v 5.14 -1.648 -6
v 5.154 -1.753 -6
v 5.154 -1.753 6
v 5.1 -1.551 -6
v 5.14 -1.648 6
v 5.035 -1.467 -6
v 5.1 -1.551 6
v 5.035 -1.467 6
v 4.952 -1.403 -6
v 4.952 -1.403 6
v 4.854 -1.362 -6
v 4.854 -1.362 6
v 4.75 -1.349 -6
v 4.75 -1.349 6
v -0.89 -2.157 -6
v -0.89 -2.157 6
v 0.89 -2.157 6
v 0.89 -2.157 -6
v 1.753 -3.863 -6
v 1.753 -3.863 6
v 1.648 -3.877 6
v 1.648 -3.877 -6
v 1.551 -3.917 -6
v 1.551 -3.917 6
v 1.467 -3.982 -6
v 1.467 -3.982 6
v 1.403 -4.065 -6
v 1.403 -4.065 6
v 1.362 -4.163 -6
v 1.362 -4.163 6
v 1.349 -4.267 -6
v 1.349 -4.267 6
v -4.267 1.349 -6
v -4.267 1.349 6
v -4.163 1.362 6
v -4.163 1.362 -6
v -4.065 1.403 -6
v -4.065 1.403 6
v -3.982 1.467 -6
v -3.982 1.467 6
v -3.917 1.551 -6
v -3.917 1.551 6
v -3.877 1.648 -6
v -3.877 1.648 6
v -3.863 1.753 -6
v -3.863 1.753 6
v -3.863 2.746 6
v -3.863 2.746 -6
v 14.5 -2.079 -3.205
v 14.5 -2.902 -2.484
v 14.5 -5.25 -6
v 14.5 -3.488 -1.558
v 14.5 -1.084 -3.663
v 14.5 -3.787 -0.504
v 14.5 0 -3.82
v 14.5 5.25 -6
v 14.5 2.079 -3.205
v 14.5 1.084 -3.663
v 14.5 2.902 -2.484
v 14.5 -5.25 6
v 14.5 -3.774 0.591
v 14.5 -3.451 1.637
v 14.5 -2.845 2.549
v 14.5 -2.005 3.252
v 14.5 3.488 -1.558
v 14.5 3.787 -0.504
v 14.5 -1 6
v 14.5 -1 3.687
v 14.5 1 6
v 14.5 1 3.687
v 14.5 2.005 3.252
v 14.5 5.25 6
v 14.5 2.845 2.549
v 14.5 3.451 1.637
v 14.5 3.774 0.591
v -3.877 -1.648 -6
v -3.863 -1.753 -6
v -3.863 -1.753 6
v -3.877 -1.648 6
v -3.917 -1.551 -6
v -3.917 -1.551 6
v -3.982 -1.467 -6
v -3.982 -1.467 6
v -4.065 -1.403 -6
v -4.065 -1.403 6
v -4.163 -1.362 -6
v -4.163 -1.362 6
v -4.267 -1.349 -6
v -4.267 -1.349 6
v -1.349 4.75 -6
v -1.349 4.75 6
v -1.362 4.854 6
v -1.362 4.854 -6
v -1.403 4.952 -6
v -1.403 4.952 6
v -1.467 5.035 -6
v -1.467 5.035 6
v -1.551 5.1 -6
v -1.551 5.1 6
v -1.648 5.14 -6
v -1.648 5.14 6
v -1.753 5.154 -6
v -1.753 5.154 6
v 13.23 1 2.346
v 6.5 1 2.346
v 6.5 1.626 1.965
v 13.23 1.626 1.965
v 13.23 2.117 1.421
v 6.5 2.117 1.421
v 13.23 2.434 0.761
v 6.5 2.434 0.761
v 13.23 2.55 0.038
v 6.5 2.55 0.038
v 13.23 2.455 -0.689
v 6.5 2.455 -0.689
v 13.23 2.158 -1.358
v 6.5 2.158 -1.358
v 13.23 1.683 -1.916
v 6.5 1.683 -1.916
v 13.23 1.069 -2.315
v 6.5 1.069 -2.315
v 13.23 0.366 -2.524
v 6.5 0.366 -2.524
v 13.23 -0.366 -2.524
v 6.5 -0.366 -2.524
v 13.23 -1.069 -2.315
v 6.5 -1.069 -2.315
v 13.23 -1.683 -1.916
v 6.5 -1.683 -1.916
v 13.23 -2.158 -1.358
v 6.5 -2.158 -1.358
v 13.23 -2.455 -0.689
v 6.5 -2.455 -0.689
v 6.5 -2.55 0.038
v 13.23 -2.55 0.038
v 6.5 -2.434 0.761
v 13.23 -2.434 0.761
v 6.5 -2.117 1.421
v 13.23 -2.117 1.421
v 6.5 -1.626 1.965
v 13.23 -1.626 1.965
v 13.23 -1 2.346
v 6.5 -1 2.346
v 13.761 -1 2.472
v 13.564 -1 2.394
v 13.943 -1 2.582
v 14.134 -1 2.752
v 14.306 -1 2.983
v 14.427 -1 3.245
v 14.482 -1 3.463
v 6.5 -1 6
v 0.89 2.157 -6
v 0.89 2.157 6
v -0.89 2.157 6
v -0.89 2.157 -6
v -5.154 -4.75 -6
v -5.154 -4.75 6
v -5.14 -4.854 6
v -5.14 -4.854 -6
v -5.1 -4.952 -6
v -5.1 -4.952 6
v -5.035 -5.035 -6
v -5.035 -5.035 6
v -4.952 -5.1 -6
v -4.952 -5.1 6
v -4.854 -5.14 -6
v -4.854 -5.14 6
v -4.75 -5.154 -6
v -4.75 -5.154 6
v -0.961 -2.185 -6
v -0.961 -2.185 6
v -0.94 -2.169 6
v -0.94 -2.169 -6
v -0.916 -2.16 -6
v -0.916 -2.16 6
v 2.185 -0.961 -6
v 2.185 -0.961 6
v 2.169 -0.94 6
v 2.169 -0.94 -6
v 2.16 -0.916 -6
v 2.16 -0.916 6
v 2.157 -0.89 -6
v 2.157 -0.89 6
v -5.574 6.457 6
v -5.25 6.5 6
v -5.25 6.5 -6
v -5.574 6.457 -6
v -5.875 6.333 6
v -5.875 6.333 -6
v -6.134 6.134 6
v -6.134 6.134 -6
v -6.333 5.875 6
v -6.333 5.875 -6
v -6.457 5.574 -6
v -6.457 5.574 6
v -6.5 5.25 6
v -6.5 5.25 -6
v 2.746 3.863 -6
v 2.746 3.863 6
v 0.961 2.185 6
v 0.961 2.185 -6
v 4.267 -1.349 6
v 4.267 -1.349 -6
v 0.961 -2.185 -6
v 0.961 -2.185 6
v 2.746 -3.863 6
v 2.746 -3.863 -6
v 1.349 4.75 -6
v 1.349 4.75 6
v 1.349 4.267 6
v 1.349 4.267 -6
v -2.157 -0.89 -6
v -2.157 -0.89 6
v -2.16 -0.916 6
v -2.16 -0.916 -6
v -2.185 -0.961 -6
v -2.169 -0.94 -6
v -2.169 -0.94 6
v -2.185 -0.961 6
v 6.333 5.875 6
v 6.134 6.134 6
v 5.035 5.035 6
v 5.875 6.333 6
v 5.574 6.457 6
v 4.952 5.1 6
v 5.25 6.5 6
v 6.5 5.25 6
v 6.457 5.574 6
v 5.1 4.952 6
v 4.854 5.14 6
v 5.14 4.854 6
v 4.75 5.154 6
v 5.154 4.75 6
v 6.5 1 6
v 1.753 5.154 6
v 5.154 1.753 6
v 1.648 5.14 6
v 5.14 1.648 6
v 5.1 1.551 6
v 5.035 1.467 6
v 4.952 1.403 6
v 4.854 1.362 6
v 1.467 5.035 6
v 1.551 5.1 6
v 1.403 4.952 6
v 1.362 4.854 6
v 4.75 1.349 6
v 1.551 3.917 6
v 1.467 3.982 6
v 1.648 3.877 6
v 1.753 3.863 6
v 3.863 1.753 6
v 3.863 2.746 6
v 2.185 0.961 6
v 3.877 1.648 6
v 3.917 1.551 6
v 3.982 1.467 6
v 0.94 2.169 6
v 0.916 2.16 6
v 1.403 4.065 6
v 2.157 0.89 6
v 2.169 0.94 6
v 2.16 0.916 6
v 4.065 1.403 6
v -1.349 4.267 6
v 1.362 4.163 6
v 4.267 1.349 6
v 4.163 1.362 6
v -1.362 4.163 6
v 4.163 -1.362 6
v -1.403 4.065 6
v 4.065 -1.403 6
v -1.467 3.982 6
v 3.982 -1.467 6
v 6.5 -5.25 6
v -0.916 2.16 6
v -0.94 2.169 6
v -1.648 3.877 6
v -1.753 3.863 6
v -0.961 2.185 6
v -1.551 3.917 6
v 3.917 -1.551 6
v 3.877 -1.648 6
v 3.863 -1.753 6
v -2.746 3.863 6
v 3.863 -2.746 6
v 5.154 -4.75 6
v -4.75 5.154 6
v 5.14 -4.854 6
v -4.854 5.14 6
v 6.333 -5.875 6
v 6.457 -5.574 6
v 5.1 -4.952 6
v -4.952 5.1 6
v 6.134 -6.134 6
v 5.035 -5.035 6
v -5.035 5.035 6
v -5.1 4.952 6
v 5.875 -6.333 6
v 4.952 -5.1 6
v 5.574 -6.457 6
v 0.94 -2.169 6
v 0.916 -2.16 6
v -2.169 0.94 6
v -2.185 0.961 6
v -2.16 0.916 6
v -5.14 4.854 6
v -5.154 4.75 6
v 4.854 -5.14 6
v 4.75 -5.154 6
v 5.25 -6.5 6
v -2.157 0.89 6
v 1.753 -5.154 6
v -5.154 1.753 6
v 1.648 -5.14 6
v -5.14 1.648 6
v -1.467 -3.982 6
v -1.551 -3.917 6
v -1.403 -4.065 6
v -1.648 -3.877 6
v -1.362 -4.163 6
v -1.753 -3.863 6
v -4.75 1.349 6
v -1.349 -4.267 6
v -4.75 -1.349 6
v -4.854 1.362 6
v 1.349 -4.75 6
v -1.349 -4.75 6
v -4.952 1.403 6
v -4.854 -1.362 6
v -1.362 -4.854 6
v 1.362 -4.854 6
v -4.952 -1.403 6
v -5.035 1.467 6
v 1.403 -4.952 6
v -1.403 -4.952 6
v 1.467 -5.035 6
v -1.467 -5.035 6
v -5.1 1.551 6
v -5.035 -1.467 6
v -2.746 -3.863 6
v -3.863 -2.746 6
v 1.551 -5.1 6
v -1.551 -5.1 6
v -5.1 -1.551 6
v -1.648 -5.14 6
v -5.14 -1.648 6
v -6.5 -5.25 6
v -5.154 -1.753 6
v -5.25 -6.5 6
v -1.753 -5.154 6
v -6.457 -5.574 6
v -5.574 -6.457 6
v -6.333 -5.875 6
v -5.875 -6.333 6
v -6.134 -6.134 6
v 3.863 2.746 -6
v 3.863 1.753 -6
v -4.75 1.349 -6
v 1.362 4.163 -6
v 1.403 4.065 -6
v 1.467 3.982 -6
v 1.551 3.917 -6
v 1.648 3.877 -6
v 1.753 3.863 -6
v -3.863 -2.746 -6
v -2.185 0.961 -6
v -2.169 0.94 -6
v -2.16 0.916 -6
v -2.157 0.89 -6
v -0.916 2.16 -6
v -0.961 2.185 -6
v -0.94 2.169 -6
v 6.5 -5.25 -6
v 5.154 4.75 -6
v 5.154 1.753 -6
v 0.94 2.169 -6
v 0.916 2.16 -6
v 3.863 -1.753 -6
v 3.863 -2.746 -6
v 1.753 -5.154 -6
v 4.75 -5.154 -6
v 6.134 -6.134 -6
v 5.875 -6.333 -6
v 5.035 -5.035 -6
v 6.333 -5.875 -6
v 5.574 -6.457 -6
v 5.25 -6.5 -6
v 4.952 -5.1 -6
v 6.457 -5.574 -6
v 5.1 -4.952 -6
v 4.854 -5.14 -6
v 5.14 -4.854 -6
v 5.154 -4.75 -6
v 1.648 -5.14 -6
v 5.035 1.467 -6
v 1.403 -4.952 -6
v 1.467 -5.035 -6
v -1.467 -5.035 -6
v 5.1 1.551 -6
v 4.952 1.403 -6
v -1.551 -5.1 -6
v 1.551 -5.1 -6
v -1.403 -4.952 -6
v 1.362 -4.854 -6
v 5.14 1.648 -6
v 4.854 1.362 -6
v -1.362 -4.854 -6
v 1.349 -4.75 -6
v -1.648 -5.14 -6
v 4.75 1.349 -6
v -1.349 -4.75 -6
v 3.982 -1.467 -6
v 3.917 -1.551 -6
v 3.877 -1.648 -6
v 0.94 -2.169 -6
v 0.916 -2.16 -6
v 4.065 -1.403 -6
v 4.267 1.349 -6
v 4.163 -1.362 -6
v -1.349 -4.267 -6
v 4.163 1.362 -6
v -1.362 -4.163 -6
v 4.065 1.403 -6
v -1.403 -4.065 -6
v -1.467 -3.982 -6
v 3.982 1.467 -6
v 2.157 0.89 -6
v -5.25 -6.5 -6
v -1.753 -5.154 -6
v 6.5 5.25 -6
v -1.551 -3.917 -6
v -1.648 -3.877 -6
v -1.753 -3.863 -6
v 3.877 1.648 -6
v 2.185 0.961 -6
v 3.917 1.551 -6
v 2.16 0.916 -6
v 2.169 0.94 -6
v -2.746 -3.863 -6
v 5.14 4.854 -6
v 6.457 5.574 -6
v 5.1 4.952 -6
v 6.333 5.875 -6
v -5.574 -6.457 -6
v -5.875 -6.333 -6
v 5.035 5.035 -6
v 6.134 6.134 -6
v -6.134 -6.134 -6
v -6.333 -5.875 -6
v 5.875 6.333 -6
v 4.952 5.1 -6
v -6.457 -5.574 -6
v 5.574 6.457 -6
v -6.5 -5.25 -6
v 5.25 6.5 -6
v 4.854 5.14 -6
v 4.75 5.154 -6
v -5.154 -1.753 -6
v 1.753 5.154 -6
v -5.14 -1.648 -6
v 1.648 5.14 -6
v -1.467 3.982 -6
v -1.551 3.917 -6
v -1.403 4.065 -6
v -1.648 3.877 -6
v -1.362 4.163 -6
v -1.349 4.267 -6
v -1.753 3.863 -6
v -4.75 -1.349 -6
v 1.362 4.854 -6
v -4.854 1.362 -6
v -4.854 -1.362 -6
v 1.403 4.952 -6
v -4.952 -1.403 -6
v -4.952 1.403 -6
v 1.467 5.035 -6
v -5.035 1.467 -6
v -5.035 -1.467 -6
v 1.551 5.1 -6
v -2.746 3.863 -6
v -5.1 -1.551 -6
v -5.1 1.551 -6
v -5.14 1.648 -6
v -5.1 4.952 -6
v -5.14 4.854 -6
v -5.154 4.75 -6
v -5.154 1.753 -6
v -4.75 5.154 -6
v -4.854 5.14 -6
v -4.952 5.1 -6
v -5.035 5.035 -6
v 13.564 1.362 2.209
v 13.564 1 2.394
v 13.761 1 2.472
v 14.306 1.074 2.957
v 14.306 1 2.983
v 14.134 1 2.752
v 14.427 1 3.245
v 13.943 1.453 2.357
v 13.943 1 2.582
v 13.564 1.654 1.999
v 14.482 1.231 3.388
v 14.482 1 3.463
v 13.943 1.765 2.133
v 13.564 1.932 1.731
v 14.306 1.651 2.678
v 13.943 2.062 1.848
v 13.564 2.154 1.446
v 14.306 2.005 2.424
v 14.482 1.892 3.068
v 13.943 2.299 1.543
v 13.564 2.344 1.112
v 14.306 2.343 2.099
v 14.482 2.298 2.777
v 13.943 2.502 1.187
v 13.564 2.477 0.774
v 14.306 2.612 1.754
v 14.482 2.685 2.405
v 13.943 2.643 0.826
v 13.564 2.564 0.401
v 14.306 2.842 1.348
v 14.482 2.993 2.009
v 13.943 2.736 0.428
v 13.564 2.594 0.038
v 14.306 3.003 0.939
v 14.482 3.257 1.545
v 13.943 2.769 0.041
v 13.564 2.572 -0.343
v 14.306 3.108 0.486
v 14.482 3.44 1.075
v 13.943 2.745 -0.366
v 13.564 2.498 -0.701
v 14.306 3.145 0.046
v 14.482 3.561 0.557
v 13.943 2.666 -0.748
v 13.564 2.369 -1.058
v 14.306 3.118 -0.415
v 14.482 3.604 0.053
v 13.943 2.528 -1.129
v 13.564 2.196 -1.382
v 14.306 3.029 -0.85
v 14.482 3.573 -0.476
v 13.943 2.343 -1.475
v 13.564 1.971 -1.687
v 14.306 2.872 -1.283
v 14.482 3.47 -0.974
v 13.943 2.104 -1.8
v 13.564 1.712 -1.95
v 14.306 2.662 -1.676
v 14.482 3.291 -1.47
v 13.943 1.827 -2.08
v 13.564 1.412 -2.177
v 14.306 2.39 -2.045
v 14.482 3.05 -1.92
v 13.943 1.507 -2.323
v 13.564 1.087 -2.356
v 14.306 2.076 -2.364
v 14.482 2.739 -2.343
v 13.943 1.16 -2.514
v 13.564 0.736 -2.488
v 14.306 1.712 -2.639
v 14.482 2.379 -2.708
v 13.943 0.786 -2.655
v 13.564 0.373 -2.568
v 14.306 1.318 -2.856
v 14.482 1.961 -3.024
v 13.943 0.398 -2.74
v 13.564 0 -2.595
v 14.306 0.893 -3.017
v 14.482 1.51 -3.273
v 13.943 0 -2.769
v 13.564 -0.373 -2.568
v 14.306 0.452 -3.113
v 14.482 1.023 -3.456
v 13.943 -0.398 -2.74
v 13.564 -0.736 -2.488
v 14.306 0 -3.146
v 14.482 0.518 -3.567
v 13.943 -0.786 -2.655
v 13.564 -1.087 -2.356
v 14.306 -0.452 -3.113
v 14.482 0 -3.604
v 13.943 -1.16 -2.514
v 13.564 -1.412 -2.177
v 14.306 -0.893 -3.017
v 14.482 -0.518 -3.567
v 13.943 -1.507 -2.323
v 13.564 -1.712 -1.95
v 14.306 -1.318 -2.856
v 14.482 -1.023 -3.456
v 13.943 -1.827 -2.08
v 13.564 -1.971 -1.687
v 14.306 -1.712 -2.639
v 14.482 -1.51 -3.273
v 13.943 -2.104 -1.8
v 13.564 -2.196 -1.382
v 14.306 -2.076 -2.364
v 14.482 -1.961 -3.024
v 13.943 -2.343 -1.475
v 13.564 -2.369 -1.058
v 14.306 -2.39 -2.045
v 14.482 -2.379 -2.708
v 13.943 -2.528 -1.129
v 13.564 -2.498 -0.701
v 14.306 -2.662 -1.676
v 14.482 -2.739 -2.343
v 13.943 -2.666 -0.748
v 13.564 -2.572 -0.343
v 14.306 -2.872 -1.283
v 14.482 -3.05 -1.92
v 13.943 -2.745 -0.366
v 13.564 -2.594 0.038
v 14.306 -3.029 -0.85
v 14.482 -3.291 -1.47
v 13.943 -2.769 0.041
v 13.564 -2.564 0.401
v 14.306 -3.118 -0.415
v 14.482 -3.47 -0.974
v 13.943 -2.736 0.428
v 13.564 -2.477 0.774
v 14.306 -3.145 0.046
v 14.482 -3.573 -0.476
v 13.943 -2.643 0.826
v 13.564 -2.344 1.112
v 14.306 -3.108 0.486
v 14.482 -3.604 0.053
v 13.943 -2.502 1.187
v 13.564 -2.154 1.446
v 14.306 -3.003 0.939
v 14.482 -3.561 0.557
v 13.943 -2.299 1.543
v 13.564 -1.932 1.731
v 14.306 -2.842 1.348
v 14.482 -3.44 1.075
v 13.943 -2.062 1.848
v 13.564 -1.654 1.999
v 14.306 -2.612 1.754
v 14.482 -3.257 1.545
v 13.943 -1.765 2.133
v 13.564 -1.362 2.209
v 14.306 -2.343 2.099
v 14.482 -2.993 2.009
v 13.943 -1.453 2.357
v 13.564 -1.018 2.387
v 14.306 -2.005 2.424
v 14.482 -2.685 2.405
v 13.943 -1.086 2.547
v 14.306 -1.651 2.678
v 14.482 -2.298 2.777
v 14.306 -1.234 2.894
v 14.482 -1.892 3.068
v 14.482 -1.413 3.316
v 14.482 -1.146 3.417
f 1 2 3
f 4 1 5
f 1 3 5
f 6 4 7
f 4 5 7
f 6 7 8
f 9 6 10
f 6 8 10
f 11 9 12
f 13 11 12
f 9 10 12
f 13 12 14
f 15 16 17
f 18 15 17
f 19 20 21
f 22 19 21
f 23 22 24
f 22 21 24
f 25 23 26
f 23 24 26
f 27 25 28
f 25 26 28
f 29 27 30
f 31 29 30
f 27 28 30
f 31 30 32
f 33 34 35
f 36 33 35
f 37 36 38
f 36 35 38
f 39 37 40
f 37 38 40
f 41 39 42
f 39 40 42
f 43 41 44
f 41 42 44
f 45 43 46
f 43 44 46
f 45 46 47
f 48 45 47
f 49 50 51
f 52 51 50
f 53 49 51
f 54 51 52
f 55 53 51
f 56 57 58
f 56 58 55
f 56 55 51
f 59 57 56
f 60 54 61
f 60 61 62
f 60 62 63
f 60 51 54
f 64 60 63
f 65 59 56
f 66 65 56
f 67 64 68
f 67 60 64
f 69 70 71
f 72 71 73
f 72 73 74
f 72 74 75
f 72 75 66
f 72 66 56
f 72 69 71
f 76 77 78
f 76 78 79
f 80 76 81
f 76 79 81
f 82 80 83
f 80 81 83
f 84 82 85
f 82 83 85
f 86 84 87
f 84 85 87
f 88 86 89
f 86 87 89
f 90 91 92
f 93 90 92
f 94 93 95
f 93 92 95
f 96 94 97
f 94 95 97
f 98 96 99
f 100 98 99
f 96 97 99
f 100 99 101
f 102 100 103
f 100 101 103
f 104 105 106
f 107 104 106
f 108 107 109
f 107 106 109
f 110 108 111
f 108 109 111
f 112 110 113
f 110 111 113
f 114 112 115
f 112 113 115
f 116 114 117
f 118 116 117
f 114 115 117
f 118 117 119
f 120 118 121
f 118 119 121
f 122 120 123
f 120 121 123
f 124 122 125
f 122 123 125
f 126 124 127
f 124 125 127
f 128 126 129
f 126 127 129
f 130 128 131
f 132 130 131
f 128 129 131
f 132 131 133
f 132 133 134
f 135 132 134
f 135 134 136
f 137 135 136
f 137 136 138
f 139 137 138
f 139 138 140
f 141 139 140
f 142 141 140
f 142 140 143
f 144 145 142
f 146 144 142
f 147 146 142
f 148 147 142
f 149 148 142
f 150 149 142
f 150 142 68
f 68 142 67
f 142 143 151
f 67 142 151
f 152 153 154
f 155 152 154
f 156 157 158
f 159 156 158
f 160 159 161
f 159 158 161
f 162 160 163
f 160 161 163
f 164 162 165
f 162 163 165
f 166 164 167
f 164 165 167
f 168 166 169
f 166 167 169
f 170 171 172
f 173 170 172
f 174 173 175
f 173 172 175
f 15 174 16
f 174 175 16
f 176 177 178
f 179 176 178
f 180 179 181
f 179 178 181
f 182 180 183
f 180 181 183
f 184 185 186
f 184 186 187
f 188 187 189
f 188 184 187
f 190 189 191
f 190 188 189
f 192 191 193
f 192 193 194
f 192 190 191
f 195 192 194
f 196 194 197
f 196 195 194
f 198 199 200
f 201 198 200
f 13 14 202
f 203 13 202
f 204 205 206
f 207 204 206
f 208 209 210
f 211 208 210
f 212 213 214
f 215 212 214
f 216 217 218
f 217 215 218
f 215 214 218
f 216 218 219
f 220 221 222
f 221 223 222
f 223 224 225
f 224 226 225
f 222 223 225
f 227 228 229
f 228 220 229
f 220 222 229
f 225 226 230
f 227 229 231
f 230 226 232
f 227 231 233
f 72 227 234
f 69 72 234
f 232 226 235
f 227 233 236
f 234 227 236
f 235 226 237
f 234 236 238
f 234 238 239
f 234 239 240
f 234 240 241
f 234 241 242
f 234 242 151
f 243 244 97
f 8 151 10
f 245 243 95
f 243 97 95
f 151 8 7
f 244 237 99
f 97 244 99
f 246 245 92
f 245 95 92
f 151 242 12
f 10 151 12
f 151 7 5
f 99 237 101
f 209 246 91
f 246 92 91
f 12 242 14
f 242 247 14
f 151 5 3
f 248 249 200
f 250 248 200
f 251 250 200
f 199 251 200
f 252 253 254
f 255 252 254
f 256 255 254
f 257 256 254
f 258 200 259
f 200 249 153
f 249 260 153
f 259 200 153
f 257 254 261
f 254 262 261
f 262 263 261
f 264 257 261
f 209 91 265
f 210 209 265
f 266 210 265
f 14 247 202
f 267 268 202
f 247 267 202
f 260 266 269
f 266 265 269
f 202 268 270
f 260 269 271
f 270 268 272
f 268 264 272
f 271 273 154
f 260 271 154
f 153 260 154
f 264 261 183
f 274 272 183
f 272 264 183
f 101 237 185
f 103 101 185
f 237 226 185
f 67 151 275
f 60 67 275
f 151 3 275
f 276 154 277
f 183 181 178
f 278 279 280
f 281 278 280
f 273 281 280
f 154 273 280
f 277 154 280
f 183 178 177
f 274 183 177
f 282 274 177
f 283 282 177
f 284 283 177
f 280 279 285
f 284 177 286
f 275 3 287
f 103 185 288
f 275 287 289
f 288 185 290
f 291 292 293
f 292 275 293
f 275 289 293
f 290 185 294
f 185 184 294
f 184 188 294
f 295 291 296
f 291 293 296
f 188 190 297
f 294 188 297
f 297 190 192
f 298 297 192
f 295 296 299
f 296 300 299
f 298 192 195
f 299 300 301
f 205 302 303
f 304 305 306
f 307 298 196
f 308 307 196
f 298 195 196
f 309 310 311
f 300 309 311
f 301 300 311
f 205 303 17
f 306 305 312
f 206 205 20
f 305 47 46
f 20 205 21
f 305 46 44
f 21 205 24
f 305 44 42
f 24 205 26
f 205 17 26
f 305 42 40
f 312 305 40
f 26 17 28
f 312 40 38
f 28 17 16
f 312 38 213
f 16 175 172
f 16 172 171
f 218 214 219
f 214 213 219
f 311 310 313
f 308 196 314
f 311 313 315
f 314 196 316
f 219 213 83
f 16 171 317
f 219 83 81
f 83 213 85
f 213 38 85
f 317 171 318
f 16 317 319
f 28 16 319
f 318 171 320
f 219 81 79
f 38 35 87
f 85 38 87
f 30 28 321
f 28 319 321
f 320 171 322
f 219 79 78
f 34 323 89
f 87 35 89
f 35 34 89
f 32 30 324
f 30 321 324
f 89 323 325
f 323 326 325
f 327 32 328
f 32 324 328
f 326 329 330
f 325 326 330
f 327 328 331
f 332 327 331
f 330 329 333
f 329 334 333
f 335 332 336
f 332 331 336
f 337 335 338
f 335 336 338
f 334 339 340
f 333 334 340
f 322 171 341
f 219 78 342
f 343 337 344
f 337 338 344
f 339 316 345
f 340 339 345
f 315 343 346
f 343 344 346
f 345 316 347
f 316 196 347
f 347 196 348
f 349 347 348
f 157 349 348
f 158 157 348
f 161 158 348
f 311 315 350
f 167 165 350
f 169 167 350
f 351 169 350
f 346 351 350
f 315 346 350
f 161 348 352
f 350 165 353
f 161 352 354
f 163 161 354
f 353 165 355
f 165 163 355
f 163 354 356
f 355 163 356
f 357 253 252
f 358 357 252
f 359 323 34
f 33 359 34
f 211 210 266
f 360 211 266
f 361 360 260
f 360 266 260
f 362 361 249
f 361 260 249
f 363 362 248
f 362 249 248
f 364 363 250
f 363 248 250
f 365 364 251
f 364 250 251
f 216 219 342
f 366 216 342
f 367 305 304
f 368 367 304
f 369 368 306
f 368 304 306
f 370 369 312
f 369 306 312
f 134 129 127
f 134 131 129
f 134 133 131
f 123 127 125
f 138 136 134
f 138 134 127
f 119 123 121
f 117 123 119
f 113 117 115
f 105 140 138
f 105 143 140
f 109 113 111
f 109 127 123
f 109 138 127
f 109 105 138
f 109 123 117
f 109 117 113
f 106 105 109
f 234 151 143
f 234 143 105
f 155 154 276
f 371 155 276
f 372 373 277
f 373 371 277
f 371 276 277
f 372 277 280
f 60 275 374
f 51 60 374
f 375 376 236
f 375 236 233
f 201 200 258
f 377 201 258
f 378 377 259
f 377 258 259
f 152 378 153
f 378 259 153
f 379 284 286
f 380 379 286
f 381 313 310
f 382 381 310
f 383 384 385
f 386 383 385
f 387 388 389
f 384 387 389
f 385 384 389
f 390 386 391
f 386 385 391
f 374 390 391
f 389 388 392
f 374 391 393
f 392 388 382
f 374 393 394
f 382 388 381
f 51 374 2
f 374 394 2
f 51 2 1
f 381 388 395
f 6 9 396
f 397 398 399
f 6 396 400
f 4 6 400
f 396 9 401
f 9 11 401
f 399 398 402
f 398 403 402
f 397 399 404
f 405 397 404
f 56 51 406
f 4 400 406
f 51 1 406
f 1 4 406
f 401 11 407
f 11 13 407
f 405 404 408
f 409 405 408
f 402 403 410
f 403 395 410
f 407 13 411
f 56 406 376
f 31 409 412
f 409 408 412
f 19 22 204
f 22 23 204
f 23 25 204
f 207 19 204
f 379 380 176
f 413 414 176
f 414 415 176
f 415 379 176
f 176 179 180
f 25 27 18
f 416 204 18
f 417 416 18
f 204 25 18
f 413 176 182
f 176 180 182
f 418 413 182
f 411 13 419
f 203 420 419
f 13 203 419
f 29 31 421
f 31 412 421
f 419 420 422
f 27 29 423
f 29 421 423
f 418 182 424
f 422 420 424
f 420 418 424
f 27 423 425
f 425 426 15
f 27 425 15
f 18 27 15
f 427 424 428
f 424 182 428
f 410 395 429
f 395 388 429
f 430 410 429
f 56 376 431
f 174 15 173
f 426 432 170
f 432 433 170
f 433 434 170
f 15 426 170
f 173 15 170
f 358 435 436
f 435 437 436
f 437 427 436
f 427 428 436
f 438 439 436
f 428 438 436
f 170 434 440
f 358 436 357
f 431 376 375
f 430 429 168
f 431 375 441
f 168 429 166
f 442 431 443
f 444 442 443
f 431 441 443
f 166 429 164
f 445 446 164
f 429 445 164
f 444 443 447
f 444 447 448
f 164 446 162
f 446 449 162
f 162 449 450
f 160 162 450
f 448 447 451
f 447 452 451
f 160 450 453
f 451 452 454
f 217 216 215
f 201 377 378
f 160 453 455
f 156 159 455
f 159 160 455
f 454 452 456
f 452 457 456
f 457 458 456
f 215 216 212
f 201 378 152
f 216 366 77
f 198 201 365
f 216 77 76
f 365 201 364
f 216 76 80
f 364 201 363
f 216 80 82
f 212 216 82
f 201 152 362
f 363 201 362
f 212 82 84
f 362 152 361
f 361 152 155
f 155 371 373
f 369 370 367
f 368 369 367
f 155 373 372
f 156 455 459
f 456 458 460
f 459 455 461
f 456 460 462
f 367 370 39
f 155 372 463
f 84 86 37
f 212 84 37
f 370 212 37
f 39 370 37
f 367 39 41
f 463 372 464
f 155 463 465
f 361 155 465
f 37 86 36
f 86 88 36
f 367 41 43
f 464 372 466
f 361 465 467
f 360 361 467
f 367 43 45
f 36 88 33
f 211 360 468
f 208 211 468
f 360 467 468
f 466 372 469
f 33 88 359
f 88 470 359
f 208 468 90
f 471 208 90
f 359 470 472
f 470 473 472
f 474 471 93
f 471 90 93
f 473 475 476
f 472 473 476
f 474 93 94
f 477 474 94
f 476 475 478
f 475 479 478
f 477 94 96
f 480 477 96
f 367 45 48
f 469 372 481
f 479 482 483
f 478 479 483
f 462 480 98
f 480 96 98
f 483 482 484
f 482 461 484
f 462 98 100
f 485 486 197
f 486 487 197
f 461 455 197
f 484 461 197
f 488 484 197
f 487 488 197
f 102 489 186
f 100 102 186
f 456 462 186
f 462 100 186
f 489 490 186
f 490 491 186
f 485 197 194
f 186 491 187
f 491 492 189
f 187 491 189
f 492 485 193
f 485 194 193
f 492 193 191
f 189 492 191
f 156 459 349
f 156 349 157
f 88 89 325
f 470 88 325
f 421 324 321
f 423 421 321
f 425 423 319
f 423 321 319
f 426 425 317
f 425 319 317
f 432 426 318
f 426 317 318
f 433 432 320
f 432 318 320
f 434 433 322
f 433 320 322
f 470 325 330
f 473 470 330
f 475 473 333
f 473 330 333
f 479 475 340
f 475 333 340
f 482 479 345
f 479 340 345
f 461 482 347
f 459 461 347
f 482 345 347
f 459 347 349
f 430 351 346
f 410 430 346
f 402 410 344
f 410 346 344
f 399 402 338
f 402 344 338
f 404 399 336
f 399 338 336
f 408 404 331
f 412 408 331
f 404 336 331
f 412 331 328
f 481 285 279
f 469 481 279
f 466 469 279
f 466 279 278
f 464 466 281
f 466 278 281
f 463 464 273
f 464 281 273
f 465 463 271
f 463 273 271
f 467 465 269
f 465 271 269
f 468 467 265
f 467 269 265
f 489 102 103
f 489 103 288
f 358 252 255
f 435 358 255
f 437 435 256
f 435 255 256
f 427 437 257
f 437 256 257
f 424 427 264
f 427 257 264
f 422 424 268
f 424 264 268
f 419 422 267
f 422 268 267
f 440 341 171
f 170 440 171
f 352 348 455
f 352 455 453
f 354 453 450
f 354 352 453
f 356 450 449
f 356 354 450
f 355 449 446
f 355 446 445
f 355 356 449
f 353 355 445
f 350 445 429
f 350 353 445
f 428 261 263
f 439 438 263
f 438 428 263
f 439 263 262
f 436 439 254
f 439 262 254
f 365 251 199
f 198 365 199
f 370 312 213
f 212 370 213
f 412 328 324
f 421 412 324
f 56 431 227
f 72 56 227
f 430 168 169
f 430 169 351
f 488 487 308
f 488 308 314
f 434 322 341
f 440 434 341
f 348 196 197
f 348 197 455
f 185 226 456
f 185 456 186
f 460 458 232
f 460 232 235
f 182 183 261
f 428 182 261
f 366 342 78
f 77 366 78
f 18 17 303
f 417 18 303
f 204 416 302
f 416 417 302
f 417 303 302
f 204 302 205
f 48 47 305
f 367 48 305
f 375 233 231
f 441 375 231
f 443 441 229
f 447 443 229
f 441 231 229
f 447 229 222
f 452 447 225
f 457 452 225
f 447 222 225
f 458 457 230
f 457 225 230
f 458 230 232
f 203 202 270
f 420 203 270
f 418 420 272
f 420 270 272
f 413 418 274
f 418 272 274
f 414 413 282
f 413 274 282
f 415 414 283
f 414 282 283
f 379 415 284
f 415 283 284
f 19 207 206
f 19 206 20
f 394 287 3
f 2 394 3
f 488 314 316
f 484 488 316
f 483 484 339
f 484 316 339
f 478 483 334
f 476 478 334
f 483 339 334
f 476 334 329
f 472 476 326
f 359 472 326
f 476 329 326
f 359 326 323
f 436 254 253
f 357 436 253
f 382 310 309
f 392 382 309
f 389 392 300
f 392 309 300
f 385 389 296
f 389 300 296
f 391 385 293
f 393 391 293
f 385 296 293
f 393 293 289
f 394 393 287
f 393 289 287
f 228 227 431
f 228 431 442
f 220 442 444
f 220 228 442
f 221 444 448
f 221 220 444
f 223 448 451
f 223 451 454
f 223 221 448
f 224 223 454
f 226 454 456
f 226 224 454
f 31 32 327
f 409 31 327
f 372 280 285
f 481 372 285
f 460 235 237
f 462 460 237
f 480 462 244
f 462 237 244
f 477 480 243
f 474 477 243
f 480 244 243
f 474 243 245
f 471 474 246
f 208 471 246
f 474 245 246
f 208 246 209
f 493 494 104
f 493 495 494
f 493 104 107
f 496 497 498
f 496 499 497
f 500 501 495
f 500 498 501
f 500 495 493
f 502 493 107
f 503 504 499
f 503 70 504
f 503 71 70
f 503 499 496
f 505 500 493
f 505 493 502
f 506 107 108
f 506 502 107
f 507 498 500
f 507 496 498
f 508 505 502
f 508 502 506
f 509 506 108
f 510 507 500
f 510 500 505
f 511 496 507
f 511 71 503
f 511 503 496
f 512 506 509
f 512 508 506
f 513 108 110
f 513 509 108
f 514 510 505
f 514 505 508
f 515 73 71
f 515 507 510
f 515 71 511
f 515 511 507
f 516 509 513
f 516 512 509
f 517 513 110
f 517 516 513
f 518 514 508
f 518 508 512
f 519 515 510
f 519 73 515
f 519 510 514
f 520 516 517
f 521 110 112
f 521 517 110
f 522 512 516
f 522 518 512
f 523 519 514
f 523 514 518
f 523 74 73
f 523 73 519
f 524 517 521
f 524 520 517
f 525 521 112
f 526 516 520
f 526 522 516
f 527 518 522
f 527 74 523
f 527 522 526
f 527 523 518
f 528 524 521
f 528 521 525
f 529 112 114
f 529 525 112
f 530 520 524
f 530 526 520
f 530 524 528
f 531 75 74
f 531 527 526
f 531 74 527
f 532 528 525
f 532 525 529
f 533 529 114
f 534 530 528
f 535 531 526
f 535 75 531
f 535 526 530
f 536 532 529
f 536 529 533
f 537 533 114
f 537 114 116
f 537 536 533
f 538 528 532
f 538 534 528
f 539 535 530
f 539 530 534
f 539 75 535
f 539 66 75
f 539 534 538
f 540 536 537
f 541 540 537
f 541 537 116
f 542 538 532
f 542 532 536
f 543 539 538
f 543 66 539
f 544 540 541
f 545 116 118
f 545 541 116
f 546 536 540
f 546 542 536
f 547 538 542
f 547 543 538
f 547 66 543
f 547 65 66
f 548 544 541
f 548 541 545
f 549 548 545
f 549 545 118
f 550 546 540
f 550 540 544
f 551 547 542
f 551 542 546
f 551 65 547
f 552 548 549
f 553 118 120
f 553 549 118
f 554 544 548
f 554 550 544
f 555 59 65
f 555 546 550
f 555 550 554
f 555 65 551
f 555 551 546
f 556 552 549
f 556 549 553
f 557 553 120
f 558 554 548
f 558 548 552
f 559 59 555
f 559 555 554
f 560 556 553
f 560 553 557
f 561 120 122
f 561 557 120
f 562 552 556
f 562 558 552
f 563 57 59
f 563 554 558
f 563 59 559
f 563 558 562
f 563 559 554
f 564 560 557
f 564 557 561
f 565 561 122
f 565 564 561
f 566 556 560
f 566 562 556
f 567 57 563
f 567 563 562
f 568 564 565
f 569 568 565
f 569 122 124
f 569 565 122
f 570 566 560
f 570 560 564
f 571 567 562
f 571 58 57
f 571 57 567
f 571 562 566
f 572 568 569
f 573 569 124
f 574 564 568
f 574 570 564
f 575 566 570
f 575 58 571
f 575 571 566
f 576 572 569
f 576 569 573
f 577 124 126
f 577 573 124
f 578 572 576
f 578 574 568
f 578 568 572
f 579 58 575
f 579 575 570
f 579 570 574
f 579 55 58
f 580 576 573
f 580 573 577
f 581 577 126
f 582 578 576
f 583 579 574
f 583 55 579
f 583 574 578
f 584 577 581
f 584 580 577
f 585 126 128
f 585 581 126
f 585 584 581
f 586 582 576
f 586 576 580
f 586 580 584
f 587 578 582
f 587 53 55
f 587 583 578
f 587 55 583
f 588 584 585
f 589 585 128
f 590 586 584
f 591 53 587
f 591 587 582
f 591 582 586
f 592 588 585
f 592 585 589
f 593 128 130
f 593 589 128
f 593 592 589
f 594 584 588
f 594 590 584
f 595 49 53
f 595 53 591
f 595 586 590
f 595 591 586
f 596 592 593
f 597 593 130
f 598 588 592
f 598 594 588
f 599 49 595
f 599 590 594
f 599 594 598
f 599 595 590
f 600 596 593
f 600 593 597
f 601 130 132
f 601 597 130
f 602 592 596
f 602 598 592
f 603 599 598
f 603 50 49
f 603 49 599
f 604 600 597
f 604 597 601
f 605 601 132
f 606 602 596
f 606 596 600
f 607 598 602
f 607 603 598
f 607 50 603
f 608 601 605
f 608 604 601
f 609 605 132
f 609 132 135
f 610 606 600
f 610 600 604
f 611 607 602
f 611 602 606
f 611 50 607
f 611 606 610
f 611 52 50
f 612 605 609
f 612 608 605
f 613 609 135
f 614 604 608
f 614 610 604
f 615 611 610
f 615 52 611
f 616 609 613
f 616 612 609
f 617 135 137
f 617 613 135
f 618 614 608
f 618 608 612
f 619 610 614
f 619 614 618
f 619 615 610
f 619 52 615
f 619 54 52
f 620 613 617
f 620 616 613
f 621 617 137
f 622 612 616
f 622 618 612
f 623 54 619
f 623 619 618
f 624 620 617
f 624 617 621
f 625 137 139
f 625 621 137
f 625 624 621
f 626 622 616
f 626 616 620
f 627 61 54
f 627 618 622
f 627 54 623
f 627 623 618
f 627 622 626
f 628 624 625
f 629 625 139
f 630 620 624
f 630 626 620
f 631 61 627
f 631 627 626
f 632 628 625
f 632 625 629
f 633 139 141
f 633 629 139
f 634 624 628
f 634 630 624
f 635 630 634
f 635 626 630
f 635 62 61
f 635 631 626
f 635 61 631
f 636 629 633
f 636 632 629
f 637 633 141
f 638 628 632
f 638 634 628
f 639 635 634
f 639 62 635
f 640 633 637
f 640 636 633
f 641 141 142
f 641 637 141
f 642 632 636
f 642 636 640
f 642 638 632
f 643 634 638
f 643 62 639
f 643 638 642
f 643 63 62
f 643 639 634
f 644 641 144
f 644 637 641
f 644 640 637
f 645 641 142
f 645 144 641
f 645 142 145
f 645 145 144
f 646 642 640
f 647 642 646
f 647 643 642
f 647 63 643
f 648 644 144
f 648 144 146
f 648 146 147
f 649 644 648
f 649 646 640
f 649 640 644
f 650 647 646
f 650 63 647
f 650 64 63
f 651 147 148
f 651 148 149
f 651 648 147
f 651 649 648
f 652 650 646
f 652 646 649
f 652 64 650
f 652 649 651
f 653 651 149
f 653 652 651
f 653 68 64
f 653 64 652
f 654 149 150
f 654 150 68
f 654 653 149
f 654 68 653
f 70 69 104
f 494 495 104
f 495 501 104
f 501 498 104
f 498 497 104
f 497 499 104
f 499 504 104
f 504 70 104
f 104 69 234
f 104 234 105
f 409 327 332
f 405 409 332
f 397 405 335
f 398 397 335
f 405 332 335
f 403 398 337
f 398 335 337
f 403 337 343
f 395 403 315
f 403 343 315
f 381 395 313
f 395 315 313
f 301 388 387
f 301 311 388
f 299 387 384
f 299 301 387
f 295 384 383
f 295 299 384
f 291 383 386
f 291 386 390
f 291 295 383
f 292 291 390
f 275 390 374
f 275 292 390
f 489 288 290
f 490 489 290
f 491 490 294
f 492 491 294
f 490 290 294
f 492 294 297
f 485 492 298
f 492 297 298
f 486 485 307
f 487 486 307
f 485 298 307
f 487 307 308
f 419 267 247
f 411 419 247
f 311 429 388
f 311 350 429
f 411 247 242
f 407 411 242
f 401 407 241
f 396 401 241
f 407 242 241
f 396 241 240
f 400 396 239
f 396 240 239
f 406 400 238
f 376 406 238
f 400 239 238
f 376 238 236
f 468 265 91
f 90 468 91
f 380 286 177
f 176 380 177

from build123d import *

# Parameters (mm, degrees)
F1_DEPTH = 6
F3_DEPTH = 10
F5_DEPTH = 8
F6_R     = 1.27


with BuildPart() as f1:
    # F0 (on Top) → F1 (new body, symmetric)
    with BuildSketch(Plane.XY):
        with BuildLine():
            Line((6.5, -5.25), (6.5, 5.25))
            ThreePointArc((6.5, 5.25), (6.133883, 6.133883), (5.25, 6.5))
            Line((5.25, 6.5), (-5.25, 6.5))
            ThreePointArc((-5.25, 6.5), (-6.133883, 6.133883), (-6.5, 5.25))
            Line((-6.5, 5.25), (-6.5, -5.25))
            ThreePointArc((-6.5, -5.25), (-6.133883, -6.133883), (-5.25, -6.5))
            Line((-5.25, -6.5), (5.25, -6.5))
            ThreePointArc((5.25, -6.5), (6.133883, -6.133883), (6.5, -5.25))
        make_face()
    extrude(amount=F1_DEPTH, both=True)

    # F2 (on Top) → F3 (cut, symmetric)
    with BuildSketch(Plane.XY):
        with BuildLine():
            ThreePointArc((0.889914, -2.1566), (0.928239, -2.163918), (0.961171, -2.184843))
            Line((0.961171, -2.184843), (2.745753, -3.863205))
            Line((2.745753, -3.863205), (1.752595, -3.863205))
            ThreePointArc((1.752595, -3.863205), (1.466924, -3.981534), (1.348595, -4.267205))
            Line((1.348595, -4.267205), (1.348595, -4.749805))
            ThreePointArc((1.348595, -4.749805), (1.466924, -5.035476), (1.752595, -5.153805))
            Line((1.752595, -5.153805), (4.749795, -5.153805))
            ThreePointArc((4.749795, -5.153805), (5.035466, -5.035476), (5.153795, -4.749805))
            Line((5.153795, -4.749805), (5.153795, -1.752605))
            ThreePointArc((5.153795, -1.752605), (5.035471, -1.466932), (4.749802, -1.348599))
            Line((4.749802, -1.348599), (4.267202, -1.348599))
            ThreePointArc((4.267202, -1.348599), (3.981531, -1.466927), (3.863202, -1.752599))
            Line((3.863202, -1.752599), (3.863202, -2.745756))
            Line((3.863202, -2.745756), (2.184831, -0.961164))
            ThreePointArc((2.184831, -0.961164), (2.163912, -0.928237), (2.156595, -0.889919))
            Line((2.156595, -0.889919), (2.156595, 0.889909))
            ThreePointArc((2.156595, 0.889909), (2.163912, 0.928229), (2.184834, 0.961157))
            Line((2.184834, 0.961157), (3.863202, 2.745746))
            Line((3.863202, 2.745746), (3.863202, 1.752589))
            ThreePointArc((3.863202, 1.752589), (3.981531, 1.466917), (4.267202, 1.348589))
            Line((4.267202, 1.348589), (4.749802, 1.348589))
            ThreePointArc((4.749802, 1.348589), (5.035473, 1.466917), (5.153802, 1.752589))
            Line((5.153802, 1.752589), (5.153802, 4.749789))
            ThreePointArc((5.153802, 4.749789), (5.035477, 5.035475), (4.749794, 5.153807))
            Line((4.749794, 5.153807), (1.752594, 5.153807))
            ThreePointArc((1.752594, 5.153807), (1.466922, 5.035478), (1.348594, 4.749807))
            Line((1.348594, 4.749807), (1.348594, 4.267207))
            ThreePointArc((1.348594, 4.267207), (1.466922, 3.981536), (1.752594, 3.863207))
            Line((1.752594, 3.863207), (2.745751, 3.863207))
            Line((2.745751, 3.863207), (0.961159, 2.184836))
            ThreePointArc((0.961159, 2.184836), (0.928232, 2.163916), (0.889914, 2.1566))
            Line((0.889914, 2.1566), (-0.889914, 2.1566))
            ThreePointArc((-0.889914, 2.1566), (-0.928238, 2.163918), (-0.961169, 2.184841))
            Line((-0.961169, 2.184841), (-2.745757, 3.863209))
            Line((-2.745757, 3.863209), (-1.7526, 3.863209))
            ThreePointArc((-1.7526, 3.863209), (-1.466929, 3.981538), (-1.3486, 4.267209))
            Line((-1.3486, 4.267209), (-1.3486, 4.749809))
            ThreePointArc((-1.3486, 4.749809), (-1.466937, 5.035473), (-1.752607, 5.153794))
            Line((-1.752607, 5.153794), (-4.749807, 5.153794))
            ThreePointArc((-4.749807, 5.153794), (-5.035478, 5.035465), (-5.153807, 4.749794))
            Line((-5.153807, 4.749794), (-5.153807, 1.752594))
            ThreePointArc((-5.153807, 1.752594), (-5.035478, 1.466922), (-4.749807, 1.348594))
            Line((-4.749807, 1.348594), (-4.267207, 1.348594))
            ThreePointArc((-4.267207, 1.348594), (-3.981536, 1.466922), (-3.863207, 1.752594))
            Line((-3.863207, 1.752594), (-3.863207, 2.745751))
            Line((-3.863207, 2.745751), (-2.184836, 0.961159))
            ThreePointArc((-2.184836, 0.961159), (-2.163916, 0.928232), (-2.1566, 0.889914))
            Line((-2.1566, 0.889914), (-2.1566, -0.889914))
            ThreePointArc((-2.1566, -0.889914), (-2.163918, -0.928238), (-2.184841, -0.961169))
            Line((-2.184841, -0.961169), (-3.863209, -2.745757))
            Line((-3.863209, -2.745757), (-3.863209, -1.7526))
            ThreePointArc((-3.863209, -1.7526), (-3.981538, -1.466929), (-4.267209, -1.3486))
            Line((-4.267209, -1.3486), (-4.749809, -1.3486))
            ThreePointArc((-4.749809, -1.3486), (-5.035481, -1.466929), (-5.153809, -1.7526))
            Line((-5.153809, -1.7526), (-5.153809, -4.7498))
            ThreePointArc((-5.153809, -4.7498), (-5.035481, -5.035471), (-4.749809, -5.1538))
            Line((-4.749809, -5.1538), (-1.752609, -5.1538))
            ThreePointArc((-1.752609, -5.1538), (-1.466938, -5.035471), (-1.348609, -4.7498))
            Line((-1.348609, -4.7498), (-1.348609, -4.2672))
            ThreePointArc((-1.348609, -4.2672), (-1.466935, -3.981539), (-1.752594, -3.863207))
            Line((-1.752594, -3.863207), (-2.745751, -3.863207))
            Line((-2.745751, -3.863207), (-0.961159, -2.184836))
            ThreePointArc((-0.961159, -2.184836), (-0.928232, -2.163916), (-0.889914, -2.1566))
            Line((-0.889914, -2.1566), (0.889914, -2.1566))
        make_face()
    extrude(amount=F3_DEPTH, both=True, mode=Mode.SUBTRACT)

    # F4 (on face) → F5 (join)
    with BuildSketch(Plane.YZ.offset(6.5)):
        with BuildLine():
            ThreePointArc((1, 2.345741), (0, -2.55), (-1, 2.345741))
            Line((-1, 2.345741), (-1, 6))
            Line((-1, 6), (-5.25, 6))
            Line((-5.25, 6), (-5.25, -6))
            Line((-5.25, -6), (5.25, -6))
            Line((5.25, -6), (5.25, 6))
            Line((5.25, 6), (1, 6))
            Line((1, 6), (1, 2.345741))
        make_face()
    extrude(amount=F5_DEPTH)

    # F6
    f6_edges = [f1.edges().sort_by_distance(p)[0] for p in [
        (14.5, 0, -2.55),
    ]]
    fillet(f6_edges, radius=F6_R)


solid = f1.part
